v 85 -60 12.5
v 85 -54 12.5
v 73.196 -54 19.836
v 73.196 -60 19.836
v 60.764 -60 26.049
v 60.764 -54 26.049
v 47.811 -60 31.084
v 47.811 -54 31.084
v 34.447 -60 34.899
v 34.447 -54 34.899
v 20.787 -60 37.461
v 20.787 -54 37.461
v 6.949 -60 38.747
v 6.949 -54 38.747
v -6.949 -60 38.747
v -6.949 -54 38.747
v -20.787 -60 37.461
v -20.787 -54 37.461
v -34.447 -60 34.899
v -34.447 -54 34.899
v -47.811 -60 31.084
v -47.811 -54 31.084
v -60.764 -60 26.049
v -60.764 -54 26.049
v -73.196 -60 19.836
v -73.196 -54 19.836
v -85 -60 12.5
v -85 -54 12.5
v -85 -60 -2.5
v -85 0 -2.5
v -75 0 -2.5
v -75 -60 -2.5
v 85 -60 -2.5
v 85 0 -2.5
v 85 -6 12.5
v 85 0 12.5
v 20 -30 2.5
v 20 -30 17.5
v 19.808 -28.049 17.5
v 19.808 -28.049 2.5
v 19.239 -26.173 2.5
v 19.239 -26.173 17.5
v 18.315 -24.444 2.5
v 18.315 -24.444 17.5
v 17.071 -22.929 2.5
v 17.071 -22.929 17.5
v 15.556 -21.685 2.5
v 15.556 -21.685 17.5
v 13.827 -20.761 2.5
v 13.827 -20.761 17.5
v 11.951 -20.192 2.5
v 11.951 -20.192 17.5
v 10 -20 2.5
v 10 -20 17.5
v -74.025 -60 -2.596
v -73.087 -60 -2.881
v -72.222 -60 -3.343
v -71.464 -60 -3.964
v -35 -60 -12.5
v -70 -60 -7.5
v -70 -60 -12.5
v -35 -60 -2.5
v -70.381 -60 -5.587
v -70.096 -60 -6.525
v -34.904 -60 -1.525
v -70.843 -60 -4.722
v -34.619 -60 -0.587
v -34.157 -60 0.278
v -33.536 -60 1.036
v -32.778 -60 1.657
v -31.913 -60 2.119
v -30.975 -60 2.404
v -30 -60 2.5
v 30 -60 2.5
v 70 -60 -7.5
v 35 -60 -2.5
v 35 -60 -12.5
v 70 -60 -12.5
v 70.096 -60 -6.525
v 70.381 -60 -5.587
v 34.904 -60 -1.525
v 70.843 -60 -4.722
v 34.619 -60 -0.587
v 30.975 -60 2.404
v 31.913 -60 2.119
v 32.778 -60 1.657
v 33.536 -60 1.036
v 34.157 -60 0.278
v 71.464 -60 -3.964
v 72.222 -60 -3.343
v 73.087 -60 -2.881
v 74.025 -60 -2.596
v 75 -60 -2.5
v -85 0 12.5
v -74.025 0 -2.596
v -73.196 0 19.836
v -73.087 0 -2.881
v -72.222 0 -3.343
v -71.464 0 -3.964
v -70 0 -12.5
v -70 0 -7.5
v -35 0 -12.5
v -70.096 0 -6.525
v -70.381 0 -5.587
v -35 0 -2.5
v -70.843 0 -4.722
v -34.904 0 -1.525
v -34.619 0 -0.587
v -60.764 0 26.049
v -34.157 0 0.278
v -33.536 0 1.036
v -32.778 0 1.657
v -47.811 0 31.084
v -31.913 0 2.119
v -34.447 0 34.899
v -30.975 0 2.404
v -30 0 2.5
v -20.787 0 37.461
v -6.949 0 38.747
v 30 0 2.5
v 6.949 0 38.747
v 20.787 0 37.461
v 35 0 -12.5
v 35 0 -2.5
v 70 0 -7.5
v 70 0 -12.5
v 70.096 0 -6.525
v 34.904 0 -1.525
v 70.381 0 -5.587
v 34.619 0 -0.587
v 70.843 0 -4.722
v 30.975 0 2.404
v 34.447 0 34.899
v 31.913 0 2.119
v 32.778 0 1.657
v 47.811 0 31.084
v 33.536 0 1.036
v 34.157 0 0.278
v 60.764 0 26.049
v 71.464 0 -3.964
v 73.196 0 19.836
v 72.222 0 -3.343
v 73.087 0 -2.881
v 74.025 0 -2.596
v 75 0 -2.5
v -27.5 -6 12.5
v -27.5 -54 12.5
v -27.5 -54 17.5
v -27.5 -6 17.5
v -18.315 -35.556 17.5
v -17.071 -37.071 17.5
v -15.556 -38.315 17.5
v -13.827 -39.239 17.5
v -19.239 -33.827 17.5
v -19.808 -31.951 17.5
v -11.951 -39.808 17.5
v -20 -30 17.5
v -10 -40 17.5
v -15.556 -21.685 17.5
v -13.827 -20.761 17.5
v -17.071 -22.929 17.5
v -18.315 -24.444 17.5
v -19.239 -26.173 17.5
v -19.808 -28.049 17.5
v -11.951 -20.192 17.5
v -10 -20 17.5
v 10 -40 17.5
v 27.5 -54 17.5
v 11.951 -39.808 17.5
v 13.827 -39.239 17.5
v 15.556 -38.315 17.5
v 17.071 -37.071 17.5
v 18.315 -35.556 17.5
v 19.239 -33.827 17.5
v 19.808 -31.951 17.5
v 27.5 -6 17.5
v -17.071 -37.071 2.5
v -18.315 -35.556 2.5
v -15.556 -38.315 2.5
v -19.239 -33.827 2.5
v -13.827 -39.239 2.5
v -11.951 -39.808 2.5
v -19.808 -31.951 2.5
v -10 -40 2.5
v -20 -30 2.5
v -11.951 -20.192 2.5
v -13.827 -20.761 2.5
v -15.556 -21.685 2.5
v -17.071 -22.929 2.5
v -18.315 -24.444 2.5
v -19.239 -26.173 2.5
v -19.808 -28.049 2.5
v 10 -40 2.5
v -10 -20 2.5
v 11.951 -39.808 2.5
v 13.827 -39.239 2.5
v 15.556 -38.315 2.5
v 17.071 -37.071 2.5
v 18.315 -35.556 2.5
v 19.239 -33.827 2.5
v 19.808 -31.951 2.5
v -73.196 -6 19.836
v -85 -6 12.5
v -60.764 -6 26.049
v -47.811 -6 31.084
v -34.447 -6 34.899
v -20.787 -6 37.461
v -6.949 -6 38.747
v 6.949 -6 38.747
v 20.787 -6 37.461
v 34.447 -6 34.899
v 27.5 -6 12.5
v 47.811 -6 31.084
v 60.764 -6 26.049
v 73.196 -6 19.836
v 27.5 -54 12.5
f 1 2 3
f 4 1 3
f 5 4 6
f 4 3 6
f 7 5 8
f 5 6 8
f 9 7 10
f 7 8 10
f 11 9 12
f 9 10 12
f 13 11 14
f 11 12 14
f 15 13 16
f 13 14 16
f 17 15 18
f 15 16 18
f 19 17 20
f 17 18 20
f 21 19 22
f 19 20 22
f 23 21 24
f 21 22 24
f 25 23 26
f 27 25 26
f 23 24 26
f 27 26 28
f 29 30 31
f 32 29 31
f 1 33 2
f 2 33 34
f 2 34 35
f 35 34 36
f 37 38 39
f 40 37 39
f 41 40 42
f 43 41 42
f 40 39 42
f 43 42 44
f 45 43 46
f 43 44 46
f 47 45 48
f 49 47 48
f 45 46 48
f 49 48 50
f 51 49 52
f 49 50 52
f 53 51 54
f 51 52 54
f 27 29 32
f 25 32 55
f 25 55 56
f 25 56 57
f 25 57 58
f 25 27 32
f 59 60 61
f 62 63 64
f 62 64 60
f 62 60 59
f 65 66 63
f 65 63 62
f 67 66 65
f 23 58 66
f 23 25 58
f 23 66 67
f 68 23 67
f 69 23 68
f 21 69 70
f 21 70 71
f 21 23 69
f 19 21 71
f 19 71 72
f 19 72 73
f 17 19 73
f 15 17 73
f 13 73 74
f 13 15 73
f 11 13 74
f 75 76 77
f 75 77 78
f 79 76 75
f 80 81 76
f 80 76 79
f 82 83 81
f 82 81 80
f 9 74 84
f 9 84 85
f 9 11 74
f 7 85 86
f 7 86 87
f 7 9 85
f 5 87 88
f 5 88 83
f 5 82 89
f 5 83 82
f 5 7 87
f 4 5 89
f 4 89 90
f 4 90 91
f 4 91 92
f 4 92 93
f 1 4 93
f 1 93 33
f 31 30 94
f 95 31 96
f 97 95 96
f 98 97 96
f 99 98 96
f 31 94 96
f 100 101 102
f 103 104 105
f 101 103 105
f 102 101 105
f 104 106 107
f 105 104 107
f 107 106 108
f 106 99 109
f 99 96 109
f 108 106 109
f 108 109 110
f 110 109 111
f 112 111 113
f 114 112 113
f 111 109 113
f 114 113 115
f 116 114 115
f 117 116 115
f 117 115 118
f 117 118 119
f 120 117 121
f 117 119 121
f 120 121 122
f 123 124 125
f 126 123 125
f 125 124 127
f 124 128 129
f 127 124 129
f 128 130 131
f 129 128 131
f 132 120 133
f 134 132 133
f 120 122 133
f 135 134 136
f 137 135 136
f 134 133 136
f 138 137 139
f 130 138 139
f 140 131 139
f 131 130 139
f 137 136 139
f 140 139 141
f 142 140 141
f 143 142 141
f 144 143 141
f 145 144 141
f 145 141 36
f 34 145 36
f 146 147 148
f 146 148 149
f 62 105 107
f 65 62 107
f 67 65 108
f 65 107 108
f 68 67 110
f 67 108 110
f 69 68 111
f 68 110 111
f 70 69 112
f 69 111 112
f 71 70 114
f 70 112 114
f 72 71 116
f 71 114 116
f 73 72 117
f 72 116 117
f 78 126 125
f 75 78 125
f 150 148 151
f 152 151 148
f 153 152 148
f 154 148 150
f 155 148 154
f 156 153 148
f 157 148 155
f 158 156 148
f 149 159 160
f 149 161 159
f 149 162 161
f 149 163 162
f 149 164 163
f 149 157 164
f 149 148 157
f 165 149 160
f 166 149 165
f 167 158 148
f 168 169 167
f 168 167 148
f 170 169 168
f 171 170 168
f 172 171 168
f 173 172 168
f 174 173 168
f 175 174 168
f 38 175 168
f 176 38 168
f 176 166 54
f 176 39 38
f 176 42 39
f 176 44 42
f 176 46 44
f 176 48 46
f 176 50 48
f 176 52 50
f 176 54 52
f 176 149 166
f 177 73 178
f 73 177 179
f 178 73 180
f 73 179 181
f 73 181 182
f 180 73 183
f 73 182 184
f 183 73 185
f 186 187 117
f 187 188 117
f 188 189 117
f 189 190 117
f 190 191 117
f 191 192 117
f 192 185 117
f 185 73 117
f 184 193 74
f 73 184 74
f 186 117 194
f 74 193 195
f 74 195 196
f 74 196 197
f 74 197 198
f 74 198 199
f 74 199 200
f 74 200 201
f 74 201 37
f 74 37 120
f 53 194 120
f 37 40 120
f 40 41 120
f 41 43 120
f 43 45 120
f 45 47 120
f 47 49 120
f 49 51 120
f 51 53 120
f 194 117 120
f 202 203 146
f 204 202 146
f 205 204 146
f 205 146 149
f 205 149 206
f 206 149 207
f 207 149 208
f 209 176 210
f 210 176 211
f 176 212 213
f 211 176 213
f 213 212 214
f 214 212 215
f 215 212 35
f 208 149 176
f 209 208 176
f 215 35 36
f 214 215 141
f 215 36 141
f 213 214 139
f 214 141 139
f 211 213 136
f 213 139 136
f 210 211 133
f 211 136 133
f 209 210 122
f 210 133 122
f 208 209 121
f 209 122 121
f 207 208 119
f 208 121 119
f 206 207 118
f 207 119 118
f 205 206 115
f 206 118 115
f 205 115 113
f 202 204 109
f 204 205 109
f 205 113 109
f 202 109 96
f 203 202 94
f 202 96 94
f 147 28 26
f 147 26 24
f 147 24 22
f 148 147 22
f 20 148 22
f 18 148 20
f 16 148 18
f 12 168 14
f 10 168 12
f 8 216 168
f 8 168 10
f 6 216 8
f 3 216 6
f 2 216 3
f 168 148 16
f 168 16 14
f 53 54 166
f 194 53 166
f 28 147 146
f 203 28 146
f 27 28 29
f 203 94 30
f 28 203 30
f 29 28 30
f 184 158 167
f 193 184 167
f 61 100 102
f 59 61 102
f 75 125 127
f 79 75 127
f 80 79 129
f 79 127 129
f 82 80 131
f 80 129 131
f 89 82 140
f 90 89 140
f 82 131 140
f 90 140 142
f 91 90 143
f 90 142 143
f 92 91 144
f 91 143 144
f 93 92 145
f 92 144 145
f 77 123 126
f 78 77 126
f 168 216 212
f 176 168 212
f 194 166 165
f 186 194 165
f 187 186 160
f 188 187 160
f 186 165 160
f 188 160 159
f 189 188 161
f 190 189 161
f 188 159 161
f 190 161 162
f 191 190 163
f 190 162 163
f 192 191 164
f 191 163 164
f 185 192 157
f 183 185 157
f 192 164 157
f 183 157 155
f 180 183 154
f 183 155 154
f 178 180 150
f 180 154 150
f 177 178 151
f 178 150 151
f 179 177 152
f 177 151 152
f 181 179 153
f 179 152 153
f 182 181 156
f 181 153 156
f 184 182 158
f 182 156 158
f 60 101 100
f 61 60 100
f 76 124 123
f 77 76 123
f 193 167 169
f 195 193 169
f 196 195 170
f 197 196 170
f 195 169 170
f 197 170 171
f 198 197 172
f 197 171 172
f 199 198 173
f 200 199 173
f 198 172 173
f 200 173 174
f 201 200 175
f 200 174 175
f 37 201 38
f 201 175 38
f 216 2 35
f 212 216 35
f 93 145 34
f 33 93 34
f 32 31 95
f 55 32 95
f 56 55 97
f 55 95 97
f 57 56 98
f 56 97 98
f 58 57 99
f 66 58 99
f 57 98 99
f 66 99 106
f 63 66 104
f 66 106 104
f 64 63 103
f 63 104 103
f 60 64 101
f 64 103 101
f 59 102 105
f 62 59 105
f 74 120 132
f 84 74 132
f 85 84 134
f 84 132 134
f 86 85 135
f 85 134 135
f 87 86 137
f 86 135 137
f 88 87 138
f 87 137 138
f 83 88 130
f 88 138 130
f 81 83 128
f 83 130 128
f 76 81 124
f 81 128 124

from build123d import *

# Parameters (mm, degrees)
F1_DEPTH = 60
F2_W     = 48
F2_H     = 28.6153249443
F3_DEPTH = 170.001
F4_W     = 55
F4_H     = 48
F5_DEPTH = 5
F7_DEPTH = 30.001


with BuildPart() as f1:
    # F0 (on Front) → F1 (new body)
    with BuildSketch(Plane.XZ):
        with BuildLine():
            Line((-70, -7.5), (-70, -12.5))
            Line((-70, -12.5), (-35, -12.5))
            Line((-35, -12.5), (-35, -2.5))
            ThreePointArc((-35, -2.5), (-33.5355339059, 1.0355339059), (-30, 2.5))
            Line((-30, 2.5), (30, 2.5))
            ThreePointArc((30, 2.5), (33.5355339059, 1.0355339059), (35, -2.5))
            Line((35, -2.5), (35, -12.5))
            Line((35, -12.5), (70, -12.5))
            Line((70, -12.5), (70, -7.5))
            ThreePointArc((70, -7.5), (71.4644660941, -3.9644660941), (75, -2.5))
            Line((75, -2.5), (85, -2.5))
            Line((85, -2.5), (85, 12.5))
            Line((85, 12.5), (-85, 12.5))
            Line((-85, 12.5), (-85, -2.5))
            Line((-85, -2.5), (-75, -2.5))
            ThreePointArc((-75, -2.5), (-71.4644660941, -3.9644660941), (-70, -7.5))
        make_face()
        with BuildLine():
            ThreePointArc((85, 12.5), (0, 38.9079290569), (-85, 12.5))
            Line((-85, 12.5), (85, 12.5))
        make_face()
    extrude(amount=F1_DEPTH)

    # F2 (on face) → F3 (cut, through all)
    with BuildSketch(Plane.YZ.offset(85)):
        with Locations((-30, 26.8076624721)):
            Rectangle(F2_W, F2_H)
    extrude(amount=-F3_DEPTH, mode=Mode.SUBTRACT)

    # F4 (on face) → F5 (join)
    with BuildSketch(Plane.XY.offset(12.5)):
        with Locations((0, -30)):
            Rectangle(F4_W, F4_H)
    extrude(amount=F5_DEPTH)

    # F6 (on face) → F7 (cut, through all)
    with BuildSketch(Plane.XY.offset(17.5)):
        with BuildLine():
            ThreePointArc((0, -30), (-2.9289321881, -37.0710678119), (-10, -40))
            Line((-10, -40), (10, -40))
            ThreePointArc((10, -40), (2.9289321881, -37.0710678119), (0, -30))
        make_face()
        with BuildLine():
            ThreePointArc((-10, -20), (-20, -30), (-10, -40))
            Line((-10, -40), (-10, -20))
        make_face()
        with BuildLine():
            Line((-10, -20), (-10, -40))
            ThreePointArc((-10, -40), (-2.9289321881, -37.0710678119), (0, -30))
            ThreePointArc((0, -30), (-2.9289321881, -22.9289321881), (-10, -20))
        make_face()
        with BuildLine():
            ThreePointArc((0, -30), (2.9289321881, -37.0710678119), (10, -40))
            Line((10, -40), (10, -20))
            ThreePointArc((10, -20), (2.9289321881, -22.9289321881), (0, -30))
        make_face()
        with BuildLine():
            Line((10, -20), (10, -40))
            ThreePointArc((10, -40), (17.0710678119, -37.0710678119), (20, -30))
            ThreePointArc((20, -30), (17.0710678119, -22.9289321881), (10, -20))
        make_face()
        with BuildLine():
            Line((10, -20), (-10, -20))
            ThreePointArc((-10, -20), (-2.9289321881, -22.9289321881), (0, -30))
            ThreePointArc((0, -30), (2.9289321881, -22.9289321881), (10, -20))
        make_face()
    extrude(amount=-F7_DEPTH, mode=Mode.SUBTRACT)


solid = f1.part
